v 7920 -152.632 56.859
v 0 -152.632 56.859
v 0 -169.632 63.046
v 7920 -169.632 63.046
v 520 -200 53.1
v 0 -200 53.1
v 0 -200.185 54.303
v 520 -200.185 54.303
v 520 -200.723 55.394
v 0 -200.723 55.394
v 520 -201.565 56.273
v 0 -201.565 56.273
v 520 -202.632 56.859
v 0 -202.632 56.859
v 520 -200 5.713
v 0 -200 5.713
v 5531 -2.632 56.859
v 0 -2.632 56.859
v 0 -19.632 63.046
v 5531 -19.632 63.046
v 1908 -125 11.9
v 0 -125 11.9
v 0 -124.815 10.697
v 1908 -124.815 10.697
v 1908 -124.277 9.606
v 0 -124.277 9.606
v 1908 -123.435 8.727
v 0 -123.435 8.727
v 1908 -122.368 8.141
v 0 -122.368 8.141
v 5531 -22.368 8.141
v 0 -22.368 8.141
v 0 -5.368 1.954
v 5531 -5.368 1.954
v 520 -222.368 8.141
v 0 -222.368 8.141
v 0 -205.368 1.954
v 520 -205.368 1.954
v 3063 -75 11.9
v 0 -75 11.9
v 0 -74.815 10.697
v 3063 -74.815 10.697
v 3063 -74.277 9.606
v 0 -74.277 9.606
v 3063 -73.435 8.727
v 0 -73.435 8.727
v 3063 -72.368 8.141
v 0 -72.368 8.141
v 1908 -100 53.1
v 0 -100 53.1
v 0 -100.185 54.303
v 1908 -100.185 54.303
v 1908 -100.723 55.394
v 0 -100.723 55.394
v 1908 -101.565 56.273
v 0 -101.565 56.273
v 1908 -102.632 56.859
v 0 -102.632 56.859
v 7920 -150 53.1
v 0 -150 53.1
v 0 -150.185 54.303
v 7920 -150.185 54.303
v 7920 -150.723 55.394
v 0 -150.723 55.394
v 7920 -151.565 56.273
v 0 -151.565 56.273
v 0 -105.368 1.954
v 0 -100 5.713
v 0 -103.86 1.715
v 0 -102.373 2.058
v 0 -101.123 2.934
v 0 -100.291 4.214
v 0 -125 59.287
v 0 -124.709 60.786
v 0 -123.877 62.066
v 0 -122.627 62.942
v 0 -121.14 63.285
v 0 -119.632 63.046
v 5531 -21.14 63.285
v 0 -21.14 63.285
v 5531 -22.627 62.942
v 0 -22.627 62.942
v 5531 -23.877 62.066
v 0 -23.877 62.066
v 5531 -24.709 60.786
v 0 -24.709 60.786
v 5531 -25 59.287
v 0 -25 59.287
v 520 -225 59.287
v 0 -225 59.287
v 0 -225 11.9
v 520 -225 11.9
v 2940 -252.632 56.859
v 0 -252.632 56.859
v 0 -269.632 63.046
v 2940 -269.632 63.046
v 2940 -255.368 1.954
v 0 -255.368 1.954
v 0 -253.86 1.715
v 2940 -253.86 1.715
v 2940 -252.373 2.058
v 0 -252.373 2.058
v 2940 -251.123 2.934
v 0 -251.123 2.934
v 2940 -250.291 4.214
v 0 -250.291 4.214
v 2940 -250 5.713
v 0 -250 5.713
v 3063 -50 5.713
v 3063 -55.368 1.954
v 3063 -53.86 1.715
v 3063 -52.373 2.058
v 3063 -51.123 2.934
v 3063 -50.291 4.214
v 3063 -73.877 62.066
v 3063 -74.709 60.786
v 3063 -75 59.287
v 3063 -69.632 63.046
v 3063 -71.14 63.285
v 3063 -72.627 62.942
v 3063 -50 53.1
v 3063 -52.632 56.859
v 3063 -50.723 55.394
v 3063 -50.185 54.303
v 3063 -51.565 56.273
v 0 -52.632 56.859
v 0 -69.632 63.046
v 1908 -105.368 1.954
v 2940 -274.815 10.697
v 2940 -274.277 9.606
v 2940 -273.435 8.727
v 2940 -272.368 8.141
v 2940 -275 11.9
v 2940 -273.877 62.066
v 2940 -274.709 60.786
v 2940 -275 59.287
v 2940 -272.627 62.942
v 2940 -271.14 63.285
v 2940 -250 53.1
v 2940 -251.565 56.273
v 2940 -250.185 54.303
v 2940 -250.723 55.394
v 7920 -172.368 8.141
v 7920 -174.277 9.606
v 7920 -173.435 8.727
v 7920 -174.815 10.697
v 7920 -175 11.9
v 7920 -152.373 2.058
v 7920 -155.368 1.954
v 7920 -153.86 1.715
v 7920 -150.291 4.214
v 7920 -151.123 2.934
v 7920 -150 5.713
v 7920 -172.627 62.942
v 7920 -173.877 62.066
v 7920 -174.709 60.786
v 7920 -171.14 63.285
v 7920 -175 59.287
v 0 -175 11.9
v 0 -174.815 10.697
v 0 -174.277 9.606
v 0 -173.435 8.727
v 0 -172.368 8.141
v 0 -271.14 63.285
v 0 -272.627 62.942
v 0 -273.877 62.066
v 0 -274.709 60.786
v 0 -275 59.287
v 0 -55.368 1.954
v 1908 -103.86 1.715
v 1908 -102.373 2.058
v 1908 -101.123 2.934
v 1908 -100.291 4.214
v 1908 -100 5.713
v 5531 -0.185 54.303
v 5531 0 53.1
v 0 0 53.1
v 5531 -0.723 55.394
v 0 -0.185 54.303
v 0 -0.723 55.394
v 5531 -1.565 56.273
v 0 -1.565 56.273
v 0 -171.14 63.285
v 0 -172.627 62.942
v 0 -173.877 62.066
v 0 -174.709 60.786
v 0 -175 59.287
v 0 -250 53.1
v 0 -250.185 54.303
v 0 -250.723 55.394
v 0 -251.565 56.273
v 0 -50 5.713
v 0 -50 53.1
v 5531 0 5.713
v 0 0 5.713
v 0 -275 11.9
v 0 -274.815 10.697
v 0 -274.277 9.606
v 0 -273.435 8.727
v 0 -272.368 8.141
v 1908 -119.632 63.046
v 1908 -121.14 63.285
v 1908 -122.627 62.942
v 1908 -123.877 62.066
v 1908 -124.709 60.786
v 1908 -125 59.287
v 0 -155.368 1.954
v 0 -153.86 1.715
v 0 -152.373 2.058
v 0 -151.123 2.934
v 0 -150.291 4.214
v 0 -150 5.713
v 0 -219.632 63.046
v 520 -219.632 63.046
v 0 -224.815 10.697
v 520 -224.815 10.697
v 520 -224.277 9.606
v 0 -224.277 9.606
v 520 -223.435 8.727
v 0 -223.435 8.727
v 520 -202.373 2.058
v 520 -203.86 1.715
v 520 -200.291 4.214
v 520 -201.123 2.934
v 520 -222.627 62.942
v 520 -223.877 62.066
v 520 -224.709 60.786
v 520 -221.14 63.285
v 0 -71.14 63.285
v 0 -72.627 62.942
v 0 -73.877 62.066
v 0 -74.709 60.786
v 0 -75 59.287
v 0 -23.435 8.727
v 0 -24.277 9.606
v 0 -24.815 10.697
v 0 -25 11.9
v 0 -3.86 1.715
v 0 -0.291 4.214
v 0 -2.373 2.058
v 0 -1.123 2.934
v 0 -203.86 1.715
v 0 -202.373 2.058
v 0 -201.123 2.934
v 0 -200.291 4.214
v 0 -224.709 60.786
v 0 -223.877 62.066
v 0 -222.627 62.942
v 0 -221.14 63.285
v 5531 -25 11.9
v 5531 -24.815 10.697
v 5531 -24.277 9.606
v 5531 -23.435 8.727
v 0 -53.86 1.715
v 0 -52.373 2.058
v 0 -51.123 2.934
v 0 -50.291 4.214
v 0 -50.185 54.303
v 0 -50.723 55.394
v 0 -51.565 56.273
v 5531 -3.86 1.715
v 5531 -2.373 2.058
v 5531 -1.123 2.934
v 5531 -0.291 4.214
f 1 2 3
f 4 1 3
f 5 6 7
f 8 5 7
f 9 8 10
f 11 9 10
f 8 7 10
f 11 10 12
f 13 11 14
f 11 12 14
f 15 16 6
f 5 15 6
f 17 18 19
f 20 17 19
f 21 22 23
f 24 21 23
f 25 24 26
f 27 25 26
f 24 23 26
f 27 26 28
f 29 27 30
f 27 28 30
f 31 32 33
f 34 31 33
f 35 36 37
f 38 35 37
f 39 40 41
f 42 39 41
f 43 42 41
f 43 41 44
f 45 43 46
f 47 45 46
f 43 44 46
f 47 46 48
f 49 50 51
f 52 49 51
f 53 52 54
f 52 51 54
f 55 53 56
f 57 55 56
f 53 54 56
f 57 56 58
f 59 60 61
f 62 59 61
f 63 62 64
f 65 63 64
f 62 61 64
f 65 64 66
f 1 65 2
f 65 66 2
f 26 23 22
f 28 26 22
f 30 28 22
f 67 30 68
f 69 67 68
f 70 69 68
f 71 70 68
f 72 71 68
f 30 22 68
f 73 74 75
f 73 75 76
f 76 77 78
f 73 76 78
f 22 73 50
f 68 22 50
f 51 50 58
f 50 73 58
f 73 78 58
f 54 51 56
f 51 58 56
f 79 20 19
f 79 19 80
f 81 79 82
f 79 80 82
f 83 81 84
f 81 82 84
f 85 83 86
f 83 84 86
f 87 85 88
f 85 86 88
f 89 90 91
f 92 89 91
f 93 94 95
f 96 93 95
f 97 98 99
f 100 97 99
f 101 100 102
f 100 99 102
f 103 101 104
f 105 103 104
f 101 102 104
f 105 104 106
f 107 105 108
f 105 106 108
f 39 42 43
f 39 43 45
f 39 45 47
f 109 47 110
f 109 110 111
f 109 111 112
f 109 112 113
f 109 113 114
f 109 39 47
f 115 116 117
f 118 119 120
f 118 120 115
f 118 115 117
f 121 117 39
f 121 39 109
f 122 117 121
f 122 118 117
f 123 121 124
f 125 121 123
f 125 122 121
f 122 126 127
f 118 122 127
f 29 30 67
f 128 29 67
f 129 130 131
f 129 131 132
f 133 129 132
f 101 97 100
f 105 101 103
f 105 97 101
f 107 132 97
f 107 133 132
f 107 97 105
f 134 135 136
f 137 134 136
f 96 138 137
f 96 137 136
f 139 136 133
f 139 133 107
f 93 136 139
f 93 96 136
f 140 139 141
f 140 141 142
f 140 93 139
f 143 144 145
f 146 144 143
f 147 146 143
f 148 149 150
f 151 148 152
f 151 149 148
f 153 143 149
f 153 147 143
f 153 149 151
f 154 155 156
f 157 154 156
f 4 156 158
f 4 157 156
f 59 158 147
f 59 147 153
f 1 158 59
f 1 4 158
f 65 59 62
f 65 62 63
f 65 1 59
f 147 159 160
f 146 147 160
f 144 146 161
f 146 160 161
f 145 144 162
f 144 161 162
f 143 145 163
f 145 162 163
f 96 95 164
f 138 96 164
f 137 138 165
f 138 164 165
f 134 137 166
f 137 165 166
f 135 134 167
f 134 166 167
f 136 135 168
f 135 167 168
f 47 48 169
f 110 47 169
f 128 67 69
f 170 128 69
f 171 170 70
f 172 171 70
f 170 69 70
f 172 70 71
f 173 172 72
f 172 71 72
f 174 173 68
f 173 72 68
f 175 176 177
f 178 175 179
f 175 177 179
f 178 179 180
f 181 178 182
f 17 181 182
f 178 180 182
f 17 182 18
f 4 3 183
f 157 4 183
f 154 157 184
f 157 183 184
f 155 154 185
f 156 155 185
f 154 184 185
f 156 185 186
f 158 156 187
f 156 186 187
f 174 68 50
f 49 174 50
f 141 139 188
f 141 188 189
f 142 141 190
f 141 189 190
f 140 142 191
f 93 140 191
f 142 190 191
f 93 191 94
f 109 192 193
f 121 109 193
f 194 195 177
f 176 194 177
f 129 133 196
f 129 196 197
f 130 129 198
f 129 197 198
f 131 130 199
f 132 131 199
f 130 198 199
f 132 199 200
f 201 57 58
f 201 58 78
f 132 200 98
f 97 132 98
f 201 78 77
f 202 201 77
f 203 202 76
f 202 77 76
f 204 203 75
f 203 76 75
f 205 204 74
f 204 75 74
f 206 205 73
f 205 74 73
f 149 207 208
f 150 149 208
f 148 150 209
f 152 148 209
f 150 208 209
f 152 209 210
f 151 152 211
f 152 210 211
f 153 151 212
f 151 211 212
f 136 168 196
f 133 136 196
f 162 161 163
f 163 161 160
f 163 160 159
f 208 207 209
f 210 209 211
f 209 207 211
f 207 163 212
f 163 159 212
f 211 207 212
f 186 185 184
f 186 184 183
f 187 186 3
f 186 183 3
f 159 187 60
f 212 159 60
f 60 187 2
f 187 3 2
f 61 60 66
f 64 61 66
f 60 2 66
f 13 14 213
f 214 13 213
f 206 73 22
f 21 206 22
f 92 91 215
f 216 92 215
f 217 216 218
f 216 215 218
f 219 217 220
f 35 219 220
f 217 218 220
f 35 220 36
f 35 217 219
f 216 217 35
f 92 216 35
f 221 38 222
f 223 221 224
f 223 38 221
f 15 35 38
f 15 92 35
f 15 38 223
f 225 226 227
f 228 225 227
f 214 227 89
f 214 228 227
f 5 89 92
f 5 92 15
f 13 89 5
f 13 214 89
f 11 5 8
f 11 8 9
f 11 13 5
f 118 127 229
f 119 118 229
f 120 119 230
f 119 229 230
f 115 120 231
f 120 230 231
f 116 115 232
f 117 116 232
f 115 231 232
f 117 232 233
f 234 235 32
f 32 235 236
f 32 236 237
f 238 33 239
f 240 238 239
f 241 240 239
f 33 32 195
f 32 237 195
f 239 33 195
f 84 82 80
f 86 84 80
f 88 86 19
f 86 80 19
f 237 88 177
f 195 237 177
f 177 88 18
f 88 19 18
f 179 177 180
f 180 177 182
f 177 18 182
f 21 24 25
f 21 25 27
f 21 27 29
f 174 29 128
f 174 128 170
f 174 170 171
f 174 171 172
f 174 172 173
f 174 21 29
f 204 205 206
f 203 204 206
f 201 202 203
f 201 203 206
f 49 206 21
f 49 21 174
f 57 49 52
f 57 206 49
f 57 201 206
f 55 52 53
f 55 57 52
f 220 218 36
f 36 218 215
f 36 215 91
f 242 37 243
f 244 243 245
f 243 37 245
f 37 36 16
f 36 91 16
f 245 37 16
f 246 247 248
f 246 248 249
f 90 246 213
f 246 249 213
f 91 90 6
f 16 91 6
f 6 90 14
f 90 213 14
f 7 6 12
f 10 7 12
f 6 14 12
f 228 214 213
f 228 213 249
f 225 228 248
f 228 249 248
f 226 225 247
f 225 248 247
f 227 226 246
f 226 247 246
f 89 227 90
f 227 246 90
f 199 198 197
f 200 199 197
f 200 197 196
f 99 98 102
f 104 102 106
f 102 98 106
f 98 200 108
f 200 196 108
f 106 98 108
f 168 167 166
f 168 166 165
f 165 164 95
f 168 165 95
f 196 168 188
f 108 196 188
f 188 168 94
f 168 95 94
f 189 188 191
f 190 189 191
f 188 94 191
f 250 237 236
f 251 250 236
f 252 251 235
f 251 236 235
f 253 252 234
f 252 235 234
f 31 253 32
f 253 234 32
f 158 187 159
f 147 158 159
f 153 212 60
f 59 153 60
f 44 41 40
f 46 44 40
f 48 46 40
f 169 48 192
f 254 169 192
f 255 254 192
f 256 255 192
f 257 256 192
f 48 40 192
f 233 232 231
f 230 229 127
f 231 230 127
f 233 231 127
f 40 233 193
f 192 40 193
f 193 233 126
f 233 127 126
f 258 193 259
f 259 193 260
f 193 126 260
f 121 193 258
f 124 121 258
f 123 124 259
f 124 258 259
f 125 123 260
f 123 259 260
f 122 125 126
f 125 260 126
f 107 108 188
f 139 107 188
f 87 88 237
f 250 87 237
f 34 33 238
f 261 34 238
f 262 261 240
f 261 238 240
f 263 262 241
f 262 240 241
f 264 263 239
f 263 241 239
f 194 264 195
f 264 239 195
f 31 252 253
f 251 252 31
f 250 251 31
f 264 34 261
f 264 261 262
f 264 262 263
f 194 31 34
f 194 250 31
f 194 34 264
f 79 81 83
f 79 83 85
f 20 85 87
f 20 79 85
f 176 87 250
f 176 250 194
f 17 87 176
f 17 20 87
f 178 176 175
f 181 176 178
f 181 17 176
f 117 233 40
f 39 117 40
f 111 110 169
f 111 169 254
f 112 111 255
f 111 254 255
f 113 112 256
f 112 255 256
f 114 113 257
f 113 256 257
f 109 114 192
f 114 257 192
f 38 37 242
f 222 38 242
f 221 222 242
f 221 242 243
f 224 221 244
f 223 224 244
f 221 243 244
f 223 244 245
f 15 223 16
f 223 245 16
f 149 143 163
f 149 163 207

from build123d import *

# Parameters (mm, degrees)
F1_DEPTH = 5531
F2_DEPTH = 3063
F3_DEPTH = 1908
F4_DEPTH = 7920
F5_DEPTH = 520
F6_DEPTH = 2940


with BuildPart() as f1:
    # F0 (on Right) → F1 (new body)
    with BuildSketch(Plane.YZ):
        with BuildLine():
            ThreePointArc((-5.368081, 1.953822), (-1.705694, 2.435984), (0, 5.712592))
            Line((0, 5.712592), (0, 53.099914))
            ThreePointArc((0, 53.099914), (-0.723392, 55.39422), (-2.631919, 56.858684))
            Line((-2.631919, 56.858684), (-19.631919, 63.046178))
            ThreePointArc((-19.631919, 63.046178), (-23.294306, 62.564016), (-25, 59.287408))
            Line((-25, 59.287408), (-25, 11.900086))
            ThreePointArc((-25, 11.900086), (-24.276608, 9.60578), (-22.368081, 8.141316))
            Line((-22.368081, 8.141316), (-5.368081, 1.953822))
        make_face()
    extrude(amount=F1_DEPTH)


with BuildPart() as f2:
    # F0 (on Right) → F2 (new body)
    with BuildSketch(Plane.YZ):
        with BuildLine():
            ThreePointArc((-69.631919, 63.046178), (-73.294306, 62.564016), (-75, 59.287408))
            Line((-75, 59.287408), (-75, 11.900086))
            ThreePointArc((-75, 11.900086), (-74.276608, 9.60578), (-72.368081, 8.141316))
            Line((-72.368081, 8.141316), (-55.368081, 1.953822))
            ThreePointArc((-55.368081, 1.953822), (-51.705694, 2.435984), (-50, 5.712592))
            Line((-50, 5.712592), (-50, 53.099914))
            ThreePointArc((-50, 53.099914), (-50.723392, 55.39422), (-52.631919, 56.858684))
            Line((-52.631919, 56.858684), (-69.631919, 63.046178))
        make_face()
    extrude(amount=F2_DEPTH)


with BuildPart() as f3:
    # F0 (on Right) → F3 (new body)
    with BuildSketch(Plane.YZ):
        with BuildLine():
            ThreePointArc((-119.631919, 63.046178), (-123.294306, 62.564016), (-125, 59.287408))
            Line((-125, 59.287408), (-125, 11.900086))
            ThreePointArc((-125, 11.900086), (-124.276608, 9.60578), (-122.368081, 8.141316))
            Line((-122.368081, 8.141316), (-105.368081, 1.953822))
            ThreePointArc((-105.368081, 1.953822), (-101.705694, 2.435984), (-100, 5.712592))
            Line((-100, 5.712592), (-100, 53.099914))
            ThreePointArc((-100, 53.099914), (-100.723392, 55.39422), (-102.631919, 56.858684))
            Line((-102.631919, 56.858684), (-119.631919, 63.046178))
        make_face()
    extrude(amount=F3_DEPTH)


with BuildPart() as f4:
    # F0 (on Right) → F4 (new body)
    with BuildSketch(Plane.YZ):
        with BuildLine():
            ThreePointArc((-169.631919, 63.046178), (-173.294306, 62.564016), (-175, 59.287408))
            Line((-175, 59.287408), (-175, 11.900086))
            ThreePointArc((-175, 11.900086), (-174.276608, 9.60578), (-172.368081, 8.141316))
            Line((-172.368081, 8.141316), (-155.368081, 1.953822))
            ThreePointArc((-155.368081, 1.953822), (-151.705694, 2.435984), (-150, 5.712592))
            Line((-150, 5.712592), (-150, 53.099914))
            ThreePointArc((-150, 53.099914), (-150.723392, 55.39422), (-152.631919, 56.858684))
            Line((-152.631919, 56.858684), (-169.631919, 63.046178))
        make_face()
    extrude(amount=F4_DEPTH)


with BuildPart() as f5:
    # F0 (on Right) → F5 (new body)
    with BuildSketch(Plane.YZ):
        with BuildLine():
            ThreePointArc((-219.631919, 63.046178), (-223.294306, 62.564016), (-225, 59.287408))
            Line((-225, 59.287408), (-225, 11.900086))
            ThreePointArc((-225, 11.900086), (-224.276608, 9.60578), (-222.368081, 8.141316))
            Line((-222.368081, 8.141316), (-205.368081, 1.953822))
            ThreePointArc((-205.368081, 1.953822), (-201.705694, 2.435984), (-200, 5.712592))
            Line((-200, 5.712592), (-200, 53.099914))
            ThreePointArc((-200, 53.099914), (-200.723392, 55.39422), (-202.631919, 56.858684))
            Line((-202.631919, 56.858684), (-219.631919, 63.046178))
        make_face()
    extrude(amount=F5_DEPTH)


with BuildPart() as f6:
    # F0 (on Right) → F6 (new body)
    with BuildSketch(Plane.YZ):
        with BuildLine():
            ThreePointArc((-269.631919, 63.046178), (-273.294306, 62.564016), (-275, 59.287408))
            Line((-275, 59.287408), (-275, 11.900086))
            ThreePointArc((-275, 11.900086), (-274.276608, 9.60578), (-272.368081, 8.141316))
            Line((-272.368081, 8.141316), (-255.368081, 1.953822))
            ThreePointArc((-255.368081, 1.953822), (-251.705694, 2.435984), (-250, 5.712592))
            Line((-250, 5.712592), (-250, 53.099914))
            ThreePointArc((-250, 53.099914), (-250.723392, 55.39422), (-252.631919, 56.858684))
            Line((-252.631919, 56.858684), (-269.631919, 63.046178))
        make_face()
    extrude(amount=F6_DEPTH)


solid = Compound([f1.part, f2.part, f3.part, f4.part, f5.part, f6.part])
